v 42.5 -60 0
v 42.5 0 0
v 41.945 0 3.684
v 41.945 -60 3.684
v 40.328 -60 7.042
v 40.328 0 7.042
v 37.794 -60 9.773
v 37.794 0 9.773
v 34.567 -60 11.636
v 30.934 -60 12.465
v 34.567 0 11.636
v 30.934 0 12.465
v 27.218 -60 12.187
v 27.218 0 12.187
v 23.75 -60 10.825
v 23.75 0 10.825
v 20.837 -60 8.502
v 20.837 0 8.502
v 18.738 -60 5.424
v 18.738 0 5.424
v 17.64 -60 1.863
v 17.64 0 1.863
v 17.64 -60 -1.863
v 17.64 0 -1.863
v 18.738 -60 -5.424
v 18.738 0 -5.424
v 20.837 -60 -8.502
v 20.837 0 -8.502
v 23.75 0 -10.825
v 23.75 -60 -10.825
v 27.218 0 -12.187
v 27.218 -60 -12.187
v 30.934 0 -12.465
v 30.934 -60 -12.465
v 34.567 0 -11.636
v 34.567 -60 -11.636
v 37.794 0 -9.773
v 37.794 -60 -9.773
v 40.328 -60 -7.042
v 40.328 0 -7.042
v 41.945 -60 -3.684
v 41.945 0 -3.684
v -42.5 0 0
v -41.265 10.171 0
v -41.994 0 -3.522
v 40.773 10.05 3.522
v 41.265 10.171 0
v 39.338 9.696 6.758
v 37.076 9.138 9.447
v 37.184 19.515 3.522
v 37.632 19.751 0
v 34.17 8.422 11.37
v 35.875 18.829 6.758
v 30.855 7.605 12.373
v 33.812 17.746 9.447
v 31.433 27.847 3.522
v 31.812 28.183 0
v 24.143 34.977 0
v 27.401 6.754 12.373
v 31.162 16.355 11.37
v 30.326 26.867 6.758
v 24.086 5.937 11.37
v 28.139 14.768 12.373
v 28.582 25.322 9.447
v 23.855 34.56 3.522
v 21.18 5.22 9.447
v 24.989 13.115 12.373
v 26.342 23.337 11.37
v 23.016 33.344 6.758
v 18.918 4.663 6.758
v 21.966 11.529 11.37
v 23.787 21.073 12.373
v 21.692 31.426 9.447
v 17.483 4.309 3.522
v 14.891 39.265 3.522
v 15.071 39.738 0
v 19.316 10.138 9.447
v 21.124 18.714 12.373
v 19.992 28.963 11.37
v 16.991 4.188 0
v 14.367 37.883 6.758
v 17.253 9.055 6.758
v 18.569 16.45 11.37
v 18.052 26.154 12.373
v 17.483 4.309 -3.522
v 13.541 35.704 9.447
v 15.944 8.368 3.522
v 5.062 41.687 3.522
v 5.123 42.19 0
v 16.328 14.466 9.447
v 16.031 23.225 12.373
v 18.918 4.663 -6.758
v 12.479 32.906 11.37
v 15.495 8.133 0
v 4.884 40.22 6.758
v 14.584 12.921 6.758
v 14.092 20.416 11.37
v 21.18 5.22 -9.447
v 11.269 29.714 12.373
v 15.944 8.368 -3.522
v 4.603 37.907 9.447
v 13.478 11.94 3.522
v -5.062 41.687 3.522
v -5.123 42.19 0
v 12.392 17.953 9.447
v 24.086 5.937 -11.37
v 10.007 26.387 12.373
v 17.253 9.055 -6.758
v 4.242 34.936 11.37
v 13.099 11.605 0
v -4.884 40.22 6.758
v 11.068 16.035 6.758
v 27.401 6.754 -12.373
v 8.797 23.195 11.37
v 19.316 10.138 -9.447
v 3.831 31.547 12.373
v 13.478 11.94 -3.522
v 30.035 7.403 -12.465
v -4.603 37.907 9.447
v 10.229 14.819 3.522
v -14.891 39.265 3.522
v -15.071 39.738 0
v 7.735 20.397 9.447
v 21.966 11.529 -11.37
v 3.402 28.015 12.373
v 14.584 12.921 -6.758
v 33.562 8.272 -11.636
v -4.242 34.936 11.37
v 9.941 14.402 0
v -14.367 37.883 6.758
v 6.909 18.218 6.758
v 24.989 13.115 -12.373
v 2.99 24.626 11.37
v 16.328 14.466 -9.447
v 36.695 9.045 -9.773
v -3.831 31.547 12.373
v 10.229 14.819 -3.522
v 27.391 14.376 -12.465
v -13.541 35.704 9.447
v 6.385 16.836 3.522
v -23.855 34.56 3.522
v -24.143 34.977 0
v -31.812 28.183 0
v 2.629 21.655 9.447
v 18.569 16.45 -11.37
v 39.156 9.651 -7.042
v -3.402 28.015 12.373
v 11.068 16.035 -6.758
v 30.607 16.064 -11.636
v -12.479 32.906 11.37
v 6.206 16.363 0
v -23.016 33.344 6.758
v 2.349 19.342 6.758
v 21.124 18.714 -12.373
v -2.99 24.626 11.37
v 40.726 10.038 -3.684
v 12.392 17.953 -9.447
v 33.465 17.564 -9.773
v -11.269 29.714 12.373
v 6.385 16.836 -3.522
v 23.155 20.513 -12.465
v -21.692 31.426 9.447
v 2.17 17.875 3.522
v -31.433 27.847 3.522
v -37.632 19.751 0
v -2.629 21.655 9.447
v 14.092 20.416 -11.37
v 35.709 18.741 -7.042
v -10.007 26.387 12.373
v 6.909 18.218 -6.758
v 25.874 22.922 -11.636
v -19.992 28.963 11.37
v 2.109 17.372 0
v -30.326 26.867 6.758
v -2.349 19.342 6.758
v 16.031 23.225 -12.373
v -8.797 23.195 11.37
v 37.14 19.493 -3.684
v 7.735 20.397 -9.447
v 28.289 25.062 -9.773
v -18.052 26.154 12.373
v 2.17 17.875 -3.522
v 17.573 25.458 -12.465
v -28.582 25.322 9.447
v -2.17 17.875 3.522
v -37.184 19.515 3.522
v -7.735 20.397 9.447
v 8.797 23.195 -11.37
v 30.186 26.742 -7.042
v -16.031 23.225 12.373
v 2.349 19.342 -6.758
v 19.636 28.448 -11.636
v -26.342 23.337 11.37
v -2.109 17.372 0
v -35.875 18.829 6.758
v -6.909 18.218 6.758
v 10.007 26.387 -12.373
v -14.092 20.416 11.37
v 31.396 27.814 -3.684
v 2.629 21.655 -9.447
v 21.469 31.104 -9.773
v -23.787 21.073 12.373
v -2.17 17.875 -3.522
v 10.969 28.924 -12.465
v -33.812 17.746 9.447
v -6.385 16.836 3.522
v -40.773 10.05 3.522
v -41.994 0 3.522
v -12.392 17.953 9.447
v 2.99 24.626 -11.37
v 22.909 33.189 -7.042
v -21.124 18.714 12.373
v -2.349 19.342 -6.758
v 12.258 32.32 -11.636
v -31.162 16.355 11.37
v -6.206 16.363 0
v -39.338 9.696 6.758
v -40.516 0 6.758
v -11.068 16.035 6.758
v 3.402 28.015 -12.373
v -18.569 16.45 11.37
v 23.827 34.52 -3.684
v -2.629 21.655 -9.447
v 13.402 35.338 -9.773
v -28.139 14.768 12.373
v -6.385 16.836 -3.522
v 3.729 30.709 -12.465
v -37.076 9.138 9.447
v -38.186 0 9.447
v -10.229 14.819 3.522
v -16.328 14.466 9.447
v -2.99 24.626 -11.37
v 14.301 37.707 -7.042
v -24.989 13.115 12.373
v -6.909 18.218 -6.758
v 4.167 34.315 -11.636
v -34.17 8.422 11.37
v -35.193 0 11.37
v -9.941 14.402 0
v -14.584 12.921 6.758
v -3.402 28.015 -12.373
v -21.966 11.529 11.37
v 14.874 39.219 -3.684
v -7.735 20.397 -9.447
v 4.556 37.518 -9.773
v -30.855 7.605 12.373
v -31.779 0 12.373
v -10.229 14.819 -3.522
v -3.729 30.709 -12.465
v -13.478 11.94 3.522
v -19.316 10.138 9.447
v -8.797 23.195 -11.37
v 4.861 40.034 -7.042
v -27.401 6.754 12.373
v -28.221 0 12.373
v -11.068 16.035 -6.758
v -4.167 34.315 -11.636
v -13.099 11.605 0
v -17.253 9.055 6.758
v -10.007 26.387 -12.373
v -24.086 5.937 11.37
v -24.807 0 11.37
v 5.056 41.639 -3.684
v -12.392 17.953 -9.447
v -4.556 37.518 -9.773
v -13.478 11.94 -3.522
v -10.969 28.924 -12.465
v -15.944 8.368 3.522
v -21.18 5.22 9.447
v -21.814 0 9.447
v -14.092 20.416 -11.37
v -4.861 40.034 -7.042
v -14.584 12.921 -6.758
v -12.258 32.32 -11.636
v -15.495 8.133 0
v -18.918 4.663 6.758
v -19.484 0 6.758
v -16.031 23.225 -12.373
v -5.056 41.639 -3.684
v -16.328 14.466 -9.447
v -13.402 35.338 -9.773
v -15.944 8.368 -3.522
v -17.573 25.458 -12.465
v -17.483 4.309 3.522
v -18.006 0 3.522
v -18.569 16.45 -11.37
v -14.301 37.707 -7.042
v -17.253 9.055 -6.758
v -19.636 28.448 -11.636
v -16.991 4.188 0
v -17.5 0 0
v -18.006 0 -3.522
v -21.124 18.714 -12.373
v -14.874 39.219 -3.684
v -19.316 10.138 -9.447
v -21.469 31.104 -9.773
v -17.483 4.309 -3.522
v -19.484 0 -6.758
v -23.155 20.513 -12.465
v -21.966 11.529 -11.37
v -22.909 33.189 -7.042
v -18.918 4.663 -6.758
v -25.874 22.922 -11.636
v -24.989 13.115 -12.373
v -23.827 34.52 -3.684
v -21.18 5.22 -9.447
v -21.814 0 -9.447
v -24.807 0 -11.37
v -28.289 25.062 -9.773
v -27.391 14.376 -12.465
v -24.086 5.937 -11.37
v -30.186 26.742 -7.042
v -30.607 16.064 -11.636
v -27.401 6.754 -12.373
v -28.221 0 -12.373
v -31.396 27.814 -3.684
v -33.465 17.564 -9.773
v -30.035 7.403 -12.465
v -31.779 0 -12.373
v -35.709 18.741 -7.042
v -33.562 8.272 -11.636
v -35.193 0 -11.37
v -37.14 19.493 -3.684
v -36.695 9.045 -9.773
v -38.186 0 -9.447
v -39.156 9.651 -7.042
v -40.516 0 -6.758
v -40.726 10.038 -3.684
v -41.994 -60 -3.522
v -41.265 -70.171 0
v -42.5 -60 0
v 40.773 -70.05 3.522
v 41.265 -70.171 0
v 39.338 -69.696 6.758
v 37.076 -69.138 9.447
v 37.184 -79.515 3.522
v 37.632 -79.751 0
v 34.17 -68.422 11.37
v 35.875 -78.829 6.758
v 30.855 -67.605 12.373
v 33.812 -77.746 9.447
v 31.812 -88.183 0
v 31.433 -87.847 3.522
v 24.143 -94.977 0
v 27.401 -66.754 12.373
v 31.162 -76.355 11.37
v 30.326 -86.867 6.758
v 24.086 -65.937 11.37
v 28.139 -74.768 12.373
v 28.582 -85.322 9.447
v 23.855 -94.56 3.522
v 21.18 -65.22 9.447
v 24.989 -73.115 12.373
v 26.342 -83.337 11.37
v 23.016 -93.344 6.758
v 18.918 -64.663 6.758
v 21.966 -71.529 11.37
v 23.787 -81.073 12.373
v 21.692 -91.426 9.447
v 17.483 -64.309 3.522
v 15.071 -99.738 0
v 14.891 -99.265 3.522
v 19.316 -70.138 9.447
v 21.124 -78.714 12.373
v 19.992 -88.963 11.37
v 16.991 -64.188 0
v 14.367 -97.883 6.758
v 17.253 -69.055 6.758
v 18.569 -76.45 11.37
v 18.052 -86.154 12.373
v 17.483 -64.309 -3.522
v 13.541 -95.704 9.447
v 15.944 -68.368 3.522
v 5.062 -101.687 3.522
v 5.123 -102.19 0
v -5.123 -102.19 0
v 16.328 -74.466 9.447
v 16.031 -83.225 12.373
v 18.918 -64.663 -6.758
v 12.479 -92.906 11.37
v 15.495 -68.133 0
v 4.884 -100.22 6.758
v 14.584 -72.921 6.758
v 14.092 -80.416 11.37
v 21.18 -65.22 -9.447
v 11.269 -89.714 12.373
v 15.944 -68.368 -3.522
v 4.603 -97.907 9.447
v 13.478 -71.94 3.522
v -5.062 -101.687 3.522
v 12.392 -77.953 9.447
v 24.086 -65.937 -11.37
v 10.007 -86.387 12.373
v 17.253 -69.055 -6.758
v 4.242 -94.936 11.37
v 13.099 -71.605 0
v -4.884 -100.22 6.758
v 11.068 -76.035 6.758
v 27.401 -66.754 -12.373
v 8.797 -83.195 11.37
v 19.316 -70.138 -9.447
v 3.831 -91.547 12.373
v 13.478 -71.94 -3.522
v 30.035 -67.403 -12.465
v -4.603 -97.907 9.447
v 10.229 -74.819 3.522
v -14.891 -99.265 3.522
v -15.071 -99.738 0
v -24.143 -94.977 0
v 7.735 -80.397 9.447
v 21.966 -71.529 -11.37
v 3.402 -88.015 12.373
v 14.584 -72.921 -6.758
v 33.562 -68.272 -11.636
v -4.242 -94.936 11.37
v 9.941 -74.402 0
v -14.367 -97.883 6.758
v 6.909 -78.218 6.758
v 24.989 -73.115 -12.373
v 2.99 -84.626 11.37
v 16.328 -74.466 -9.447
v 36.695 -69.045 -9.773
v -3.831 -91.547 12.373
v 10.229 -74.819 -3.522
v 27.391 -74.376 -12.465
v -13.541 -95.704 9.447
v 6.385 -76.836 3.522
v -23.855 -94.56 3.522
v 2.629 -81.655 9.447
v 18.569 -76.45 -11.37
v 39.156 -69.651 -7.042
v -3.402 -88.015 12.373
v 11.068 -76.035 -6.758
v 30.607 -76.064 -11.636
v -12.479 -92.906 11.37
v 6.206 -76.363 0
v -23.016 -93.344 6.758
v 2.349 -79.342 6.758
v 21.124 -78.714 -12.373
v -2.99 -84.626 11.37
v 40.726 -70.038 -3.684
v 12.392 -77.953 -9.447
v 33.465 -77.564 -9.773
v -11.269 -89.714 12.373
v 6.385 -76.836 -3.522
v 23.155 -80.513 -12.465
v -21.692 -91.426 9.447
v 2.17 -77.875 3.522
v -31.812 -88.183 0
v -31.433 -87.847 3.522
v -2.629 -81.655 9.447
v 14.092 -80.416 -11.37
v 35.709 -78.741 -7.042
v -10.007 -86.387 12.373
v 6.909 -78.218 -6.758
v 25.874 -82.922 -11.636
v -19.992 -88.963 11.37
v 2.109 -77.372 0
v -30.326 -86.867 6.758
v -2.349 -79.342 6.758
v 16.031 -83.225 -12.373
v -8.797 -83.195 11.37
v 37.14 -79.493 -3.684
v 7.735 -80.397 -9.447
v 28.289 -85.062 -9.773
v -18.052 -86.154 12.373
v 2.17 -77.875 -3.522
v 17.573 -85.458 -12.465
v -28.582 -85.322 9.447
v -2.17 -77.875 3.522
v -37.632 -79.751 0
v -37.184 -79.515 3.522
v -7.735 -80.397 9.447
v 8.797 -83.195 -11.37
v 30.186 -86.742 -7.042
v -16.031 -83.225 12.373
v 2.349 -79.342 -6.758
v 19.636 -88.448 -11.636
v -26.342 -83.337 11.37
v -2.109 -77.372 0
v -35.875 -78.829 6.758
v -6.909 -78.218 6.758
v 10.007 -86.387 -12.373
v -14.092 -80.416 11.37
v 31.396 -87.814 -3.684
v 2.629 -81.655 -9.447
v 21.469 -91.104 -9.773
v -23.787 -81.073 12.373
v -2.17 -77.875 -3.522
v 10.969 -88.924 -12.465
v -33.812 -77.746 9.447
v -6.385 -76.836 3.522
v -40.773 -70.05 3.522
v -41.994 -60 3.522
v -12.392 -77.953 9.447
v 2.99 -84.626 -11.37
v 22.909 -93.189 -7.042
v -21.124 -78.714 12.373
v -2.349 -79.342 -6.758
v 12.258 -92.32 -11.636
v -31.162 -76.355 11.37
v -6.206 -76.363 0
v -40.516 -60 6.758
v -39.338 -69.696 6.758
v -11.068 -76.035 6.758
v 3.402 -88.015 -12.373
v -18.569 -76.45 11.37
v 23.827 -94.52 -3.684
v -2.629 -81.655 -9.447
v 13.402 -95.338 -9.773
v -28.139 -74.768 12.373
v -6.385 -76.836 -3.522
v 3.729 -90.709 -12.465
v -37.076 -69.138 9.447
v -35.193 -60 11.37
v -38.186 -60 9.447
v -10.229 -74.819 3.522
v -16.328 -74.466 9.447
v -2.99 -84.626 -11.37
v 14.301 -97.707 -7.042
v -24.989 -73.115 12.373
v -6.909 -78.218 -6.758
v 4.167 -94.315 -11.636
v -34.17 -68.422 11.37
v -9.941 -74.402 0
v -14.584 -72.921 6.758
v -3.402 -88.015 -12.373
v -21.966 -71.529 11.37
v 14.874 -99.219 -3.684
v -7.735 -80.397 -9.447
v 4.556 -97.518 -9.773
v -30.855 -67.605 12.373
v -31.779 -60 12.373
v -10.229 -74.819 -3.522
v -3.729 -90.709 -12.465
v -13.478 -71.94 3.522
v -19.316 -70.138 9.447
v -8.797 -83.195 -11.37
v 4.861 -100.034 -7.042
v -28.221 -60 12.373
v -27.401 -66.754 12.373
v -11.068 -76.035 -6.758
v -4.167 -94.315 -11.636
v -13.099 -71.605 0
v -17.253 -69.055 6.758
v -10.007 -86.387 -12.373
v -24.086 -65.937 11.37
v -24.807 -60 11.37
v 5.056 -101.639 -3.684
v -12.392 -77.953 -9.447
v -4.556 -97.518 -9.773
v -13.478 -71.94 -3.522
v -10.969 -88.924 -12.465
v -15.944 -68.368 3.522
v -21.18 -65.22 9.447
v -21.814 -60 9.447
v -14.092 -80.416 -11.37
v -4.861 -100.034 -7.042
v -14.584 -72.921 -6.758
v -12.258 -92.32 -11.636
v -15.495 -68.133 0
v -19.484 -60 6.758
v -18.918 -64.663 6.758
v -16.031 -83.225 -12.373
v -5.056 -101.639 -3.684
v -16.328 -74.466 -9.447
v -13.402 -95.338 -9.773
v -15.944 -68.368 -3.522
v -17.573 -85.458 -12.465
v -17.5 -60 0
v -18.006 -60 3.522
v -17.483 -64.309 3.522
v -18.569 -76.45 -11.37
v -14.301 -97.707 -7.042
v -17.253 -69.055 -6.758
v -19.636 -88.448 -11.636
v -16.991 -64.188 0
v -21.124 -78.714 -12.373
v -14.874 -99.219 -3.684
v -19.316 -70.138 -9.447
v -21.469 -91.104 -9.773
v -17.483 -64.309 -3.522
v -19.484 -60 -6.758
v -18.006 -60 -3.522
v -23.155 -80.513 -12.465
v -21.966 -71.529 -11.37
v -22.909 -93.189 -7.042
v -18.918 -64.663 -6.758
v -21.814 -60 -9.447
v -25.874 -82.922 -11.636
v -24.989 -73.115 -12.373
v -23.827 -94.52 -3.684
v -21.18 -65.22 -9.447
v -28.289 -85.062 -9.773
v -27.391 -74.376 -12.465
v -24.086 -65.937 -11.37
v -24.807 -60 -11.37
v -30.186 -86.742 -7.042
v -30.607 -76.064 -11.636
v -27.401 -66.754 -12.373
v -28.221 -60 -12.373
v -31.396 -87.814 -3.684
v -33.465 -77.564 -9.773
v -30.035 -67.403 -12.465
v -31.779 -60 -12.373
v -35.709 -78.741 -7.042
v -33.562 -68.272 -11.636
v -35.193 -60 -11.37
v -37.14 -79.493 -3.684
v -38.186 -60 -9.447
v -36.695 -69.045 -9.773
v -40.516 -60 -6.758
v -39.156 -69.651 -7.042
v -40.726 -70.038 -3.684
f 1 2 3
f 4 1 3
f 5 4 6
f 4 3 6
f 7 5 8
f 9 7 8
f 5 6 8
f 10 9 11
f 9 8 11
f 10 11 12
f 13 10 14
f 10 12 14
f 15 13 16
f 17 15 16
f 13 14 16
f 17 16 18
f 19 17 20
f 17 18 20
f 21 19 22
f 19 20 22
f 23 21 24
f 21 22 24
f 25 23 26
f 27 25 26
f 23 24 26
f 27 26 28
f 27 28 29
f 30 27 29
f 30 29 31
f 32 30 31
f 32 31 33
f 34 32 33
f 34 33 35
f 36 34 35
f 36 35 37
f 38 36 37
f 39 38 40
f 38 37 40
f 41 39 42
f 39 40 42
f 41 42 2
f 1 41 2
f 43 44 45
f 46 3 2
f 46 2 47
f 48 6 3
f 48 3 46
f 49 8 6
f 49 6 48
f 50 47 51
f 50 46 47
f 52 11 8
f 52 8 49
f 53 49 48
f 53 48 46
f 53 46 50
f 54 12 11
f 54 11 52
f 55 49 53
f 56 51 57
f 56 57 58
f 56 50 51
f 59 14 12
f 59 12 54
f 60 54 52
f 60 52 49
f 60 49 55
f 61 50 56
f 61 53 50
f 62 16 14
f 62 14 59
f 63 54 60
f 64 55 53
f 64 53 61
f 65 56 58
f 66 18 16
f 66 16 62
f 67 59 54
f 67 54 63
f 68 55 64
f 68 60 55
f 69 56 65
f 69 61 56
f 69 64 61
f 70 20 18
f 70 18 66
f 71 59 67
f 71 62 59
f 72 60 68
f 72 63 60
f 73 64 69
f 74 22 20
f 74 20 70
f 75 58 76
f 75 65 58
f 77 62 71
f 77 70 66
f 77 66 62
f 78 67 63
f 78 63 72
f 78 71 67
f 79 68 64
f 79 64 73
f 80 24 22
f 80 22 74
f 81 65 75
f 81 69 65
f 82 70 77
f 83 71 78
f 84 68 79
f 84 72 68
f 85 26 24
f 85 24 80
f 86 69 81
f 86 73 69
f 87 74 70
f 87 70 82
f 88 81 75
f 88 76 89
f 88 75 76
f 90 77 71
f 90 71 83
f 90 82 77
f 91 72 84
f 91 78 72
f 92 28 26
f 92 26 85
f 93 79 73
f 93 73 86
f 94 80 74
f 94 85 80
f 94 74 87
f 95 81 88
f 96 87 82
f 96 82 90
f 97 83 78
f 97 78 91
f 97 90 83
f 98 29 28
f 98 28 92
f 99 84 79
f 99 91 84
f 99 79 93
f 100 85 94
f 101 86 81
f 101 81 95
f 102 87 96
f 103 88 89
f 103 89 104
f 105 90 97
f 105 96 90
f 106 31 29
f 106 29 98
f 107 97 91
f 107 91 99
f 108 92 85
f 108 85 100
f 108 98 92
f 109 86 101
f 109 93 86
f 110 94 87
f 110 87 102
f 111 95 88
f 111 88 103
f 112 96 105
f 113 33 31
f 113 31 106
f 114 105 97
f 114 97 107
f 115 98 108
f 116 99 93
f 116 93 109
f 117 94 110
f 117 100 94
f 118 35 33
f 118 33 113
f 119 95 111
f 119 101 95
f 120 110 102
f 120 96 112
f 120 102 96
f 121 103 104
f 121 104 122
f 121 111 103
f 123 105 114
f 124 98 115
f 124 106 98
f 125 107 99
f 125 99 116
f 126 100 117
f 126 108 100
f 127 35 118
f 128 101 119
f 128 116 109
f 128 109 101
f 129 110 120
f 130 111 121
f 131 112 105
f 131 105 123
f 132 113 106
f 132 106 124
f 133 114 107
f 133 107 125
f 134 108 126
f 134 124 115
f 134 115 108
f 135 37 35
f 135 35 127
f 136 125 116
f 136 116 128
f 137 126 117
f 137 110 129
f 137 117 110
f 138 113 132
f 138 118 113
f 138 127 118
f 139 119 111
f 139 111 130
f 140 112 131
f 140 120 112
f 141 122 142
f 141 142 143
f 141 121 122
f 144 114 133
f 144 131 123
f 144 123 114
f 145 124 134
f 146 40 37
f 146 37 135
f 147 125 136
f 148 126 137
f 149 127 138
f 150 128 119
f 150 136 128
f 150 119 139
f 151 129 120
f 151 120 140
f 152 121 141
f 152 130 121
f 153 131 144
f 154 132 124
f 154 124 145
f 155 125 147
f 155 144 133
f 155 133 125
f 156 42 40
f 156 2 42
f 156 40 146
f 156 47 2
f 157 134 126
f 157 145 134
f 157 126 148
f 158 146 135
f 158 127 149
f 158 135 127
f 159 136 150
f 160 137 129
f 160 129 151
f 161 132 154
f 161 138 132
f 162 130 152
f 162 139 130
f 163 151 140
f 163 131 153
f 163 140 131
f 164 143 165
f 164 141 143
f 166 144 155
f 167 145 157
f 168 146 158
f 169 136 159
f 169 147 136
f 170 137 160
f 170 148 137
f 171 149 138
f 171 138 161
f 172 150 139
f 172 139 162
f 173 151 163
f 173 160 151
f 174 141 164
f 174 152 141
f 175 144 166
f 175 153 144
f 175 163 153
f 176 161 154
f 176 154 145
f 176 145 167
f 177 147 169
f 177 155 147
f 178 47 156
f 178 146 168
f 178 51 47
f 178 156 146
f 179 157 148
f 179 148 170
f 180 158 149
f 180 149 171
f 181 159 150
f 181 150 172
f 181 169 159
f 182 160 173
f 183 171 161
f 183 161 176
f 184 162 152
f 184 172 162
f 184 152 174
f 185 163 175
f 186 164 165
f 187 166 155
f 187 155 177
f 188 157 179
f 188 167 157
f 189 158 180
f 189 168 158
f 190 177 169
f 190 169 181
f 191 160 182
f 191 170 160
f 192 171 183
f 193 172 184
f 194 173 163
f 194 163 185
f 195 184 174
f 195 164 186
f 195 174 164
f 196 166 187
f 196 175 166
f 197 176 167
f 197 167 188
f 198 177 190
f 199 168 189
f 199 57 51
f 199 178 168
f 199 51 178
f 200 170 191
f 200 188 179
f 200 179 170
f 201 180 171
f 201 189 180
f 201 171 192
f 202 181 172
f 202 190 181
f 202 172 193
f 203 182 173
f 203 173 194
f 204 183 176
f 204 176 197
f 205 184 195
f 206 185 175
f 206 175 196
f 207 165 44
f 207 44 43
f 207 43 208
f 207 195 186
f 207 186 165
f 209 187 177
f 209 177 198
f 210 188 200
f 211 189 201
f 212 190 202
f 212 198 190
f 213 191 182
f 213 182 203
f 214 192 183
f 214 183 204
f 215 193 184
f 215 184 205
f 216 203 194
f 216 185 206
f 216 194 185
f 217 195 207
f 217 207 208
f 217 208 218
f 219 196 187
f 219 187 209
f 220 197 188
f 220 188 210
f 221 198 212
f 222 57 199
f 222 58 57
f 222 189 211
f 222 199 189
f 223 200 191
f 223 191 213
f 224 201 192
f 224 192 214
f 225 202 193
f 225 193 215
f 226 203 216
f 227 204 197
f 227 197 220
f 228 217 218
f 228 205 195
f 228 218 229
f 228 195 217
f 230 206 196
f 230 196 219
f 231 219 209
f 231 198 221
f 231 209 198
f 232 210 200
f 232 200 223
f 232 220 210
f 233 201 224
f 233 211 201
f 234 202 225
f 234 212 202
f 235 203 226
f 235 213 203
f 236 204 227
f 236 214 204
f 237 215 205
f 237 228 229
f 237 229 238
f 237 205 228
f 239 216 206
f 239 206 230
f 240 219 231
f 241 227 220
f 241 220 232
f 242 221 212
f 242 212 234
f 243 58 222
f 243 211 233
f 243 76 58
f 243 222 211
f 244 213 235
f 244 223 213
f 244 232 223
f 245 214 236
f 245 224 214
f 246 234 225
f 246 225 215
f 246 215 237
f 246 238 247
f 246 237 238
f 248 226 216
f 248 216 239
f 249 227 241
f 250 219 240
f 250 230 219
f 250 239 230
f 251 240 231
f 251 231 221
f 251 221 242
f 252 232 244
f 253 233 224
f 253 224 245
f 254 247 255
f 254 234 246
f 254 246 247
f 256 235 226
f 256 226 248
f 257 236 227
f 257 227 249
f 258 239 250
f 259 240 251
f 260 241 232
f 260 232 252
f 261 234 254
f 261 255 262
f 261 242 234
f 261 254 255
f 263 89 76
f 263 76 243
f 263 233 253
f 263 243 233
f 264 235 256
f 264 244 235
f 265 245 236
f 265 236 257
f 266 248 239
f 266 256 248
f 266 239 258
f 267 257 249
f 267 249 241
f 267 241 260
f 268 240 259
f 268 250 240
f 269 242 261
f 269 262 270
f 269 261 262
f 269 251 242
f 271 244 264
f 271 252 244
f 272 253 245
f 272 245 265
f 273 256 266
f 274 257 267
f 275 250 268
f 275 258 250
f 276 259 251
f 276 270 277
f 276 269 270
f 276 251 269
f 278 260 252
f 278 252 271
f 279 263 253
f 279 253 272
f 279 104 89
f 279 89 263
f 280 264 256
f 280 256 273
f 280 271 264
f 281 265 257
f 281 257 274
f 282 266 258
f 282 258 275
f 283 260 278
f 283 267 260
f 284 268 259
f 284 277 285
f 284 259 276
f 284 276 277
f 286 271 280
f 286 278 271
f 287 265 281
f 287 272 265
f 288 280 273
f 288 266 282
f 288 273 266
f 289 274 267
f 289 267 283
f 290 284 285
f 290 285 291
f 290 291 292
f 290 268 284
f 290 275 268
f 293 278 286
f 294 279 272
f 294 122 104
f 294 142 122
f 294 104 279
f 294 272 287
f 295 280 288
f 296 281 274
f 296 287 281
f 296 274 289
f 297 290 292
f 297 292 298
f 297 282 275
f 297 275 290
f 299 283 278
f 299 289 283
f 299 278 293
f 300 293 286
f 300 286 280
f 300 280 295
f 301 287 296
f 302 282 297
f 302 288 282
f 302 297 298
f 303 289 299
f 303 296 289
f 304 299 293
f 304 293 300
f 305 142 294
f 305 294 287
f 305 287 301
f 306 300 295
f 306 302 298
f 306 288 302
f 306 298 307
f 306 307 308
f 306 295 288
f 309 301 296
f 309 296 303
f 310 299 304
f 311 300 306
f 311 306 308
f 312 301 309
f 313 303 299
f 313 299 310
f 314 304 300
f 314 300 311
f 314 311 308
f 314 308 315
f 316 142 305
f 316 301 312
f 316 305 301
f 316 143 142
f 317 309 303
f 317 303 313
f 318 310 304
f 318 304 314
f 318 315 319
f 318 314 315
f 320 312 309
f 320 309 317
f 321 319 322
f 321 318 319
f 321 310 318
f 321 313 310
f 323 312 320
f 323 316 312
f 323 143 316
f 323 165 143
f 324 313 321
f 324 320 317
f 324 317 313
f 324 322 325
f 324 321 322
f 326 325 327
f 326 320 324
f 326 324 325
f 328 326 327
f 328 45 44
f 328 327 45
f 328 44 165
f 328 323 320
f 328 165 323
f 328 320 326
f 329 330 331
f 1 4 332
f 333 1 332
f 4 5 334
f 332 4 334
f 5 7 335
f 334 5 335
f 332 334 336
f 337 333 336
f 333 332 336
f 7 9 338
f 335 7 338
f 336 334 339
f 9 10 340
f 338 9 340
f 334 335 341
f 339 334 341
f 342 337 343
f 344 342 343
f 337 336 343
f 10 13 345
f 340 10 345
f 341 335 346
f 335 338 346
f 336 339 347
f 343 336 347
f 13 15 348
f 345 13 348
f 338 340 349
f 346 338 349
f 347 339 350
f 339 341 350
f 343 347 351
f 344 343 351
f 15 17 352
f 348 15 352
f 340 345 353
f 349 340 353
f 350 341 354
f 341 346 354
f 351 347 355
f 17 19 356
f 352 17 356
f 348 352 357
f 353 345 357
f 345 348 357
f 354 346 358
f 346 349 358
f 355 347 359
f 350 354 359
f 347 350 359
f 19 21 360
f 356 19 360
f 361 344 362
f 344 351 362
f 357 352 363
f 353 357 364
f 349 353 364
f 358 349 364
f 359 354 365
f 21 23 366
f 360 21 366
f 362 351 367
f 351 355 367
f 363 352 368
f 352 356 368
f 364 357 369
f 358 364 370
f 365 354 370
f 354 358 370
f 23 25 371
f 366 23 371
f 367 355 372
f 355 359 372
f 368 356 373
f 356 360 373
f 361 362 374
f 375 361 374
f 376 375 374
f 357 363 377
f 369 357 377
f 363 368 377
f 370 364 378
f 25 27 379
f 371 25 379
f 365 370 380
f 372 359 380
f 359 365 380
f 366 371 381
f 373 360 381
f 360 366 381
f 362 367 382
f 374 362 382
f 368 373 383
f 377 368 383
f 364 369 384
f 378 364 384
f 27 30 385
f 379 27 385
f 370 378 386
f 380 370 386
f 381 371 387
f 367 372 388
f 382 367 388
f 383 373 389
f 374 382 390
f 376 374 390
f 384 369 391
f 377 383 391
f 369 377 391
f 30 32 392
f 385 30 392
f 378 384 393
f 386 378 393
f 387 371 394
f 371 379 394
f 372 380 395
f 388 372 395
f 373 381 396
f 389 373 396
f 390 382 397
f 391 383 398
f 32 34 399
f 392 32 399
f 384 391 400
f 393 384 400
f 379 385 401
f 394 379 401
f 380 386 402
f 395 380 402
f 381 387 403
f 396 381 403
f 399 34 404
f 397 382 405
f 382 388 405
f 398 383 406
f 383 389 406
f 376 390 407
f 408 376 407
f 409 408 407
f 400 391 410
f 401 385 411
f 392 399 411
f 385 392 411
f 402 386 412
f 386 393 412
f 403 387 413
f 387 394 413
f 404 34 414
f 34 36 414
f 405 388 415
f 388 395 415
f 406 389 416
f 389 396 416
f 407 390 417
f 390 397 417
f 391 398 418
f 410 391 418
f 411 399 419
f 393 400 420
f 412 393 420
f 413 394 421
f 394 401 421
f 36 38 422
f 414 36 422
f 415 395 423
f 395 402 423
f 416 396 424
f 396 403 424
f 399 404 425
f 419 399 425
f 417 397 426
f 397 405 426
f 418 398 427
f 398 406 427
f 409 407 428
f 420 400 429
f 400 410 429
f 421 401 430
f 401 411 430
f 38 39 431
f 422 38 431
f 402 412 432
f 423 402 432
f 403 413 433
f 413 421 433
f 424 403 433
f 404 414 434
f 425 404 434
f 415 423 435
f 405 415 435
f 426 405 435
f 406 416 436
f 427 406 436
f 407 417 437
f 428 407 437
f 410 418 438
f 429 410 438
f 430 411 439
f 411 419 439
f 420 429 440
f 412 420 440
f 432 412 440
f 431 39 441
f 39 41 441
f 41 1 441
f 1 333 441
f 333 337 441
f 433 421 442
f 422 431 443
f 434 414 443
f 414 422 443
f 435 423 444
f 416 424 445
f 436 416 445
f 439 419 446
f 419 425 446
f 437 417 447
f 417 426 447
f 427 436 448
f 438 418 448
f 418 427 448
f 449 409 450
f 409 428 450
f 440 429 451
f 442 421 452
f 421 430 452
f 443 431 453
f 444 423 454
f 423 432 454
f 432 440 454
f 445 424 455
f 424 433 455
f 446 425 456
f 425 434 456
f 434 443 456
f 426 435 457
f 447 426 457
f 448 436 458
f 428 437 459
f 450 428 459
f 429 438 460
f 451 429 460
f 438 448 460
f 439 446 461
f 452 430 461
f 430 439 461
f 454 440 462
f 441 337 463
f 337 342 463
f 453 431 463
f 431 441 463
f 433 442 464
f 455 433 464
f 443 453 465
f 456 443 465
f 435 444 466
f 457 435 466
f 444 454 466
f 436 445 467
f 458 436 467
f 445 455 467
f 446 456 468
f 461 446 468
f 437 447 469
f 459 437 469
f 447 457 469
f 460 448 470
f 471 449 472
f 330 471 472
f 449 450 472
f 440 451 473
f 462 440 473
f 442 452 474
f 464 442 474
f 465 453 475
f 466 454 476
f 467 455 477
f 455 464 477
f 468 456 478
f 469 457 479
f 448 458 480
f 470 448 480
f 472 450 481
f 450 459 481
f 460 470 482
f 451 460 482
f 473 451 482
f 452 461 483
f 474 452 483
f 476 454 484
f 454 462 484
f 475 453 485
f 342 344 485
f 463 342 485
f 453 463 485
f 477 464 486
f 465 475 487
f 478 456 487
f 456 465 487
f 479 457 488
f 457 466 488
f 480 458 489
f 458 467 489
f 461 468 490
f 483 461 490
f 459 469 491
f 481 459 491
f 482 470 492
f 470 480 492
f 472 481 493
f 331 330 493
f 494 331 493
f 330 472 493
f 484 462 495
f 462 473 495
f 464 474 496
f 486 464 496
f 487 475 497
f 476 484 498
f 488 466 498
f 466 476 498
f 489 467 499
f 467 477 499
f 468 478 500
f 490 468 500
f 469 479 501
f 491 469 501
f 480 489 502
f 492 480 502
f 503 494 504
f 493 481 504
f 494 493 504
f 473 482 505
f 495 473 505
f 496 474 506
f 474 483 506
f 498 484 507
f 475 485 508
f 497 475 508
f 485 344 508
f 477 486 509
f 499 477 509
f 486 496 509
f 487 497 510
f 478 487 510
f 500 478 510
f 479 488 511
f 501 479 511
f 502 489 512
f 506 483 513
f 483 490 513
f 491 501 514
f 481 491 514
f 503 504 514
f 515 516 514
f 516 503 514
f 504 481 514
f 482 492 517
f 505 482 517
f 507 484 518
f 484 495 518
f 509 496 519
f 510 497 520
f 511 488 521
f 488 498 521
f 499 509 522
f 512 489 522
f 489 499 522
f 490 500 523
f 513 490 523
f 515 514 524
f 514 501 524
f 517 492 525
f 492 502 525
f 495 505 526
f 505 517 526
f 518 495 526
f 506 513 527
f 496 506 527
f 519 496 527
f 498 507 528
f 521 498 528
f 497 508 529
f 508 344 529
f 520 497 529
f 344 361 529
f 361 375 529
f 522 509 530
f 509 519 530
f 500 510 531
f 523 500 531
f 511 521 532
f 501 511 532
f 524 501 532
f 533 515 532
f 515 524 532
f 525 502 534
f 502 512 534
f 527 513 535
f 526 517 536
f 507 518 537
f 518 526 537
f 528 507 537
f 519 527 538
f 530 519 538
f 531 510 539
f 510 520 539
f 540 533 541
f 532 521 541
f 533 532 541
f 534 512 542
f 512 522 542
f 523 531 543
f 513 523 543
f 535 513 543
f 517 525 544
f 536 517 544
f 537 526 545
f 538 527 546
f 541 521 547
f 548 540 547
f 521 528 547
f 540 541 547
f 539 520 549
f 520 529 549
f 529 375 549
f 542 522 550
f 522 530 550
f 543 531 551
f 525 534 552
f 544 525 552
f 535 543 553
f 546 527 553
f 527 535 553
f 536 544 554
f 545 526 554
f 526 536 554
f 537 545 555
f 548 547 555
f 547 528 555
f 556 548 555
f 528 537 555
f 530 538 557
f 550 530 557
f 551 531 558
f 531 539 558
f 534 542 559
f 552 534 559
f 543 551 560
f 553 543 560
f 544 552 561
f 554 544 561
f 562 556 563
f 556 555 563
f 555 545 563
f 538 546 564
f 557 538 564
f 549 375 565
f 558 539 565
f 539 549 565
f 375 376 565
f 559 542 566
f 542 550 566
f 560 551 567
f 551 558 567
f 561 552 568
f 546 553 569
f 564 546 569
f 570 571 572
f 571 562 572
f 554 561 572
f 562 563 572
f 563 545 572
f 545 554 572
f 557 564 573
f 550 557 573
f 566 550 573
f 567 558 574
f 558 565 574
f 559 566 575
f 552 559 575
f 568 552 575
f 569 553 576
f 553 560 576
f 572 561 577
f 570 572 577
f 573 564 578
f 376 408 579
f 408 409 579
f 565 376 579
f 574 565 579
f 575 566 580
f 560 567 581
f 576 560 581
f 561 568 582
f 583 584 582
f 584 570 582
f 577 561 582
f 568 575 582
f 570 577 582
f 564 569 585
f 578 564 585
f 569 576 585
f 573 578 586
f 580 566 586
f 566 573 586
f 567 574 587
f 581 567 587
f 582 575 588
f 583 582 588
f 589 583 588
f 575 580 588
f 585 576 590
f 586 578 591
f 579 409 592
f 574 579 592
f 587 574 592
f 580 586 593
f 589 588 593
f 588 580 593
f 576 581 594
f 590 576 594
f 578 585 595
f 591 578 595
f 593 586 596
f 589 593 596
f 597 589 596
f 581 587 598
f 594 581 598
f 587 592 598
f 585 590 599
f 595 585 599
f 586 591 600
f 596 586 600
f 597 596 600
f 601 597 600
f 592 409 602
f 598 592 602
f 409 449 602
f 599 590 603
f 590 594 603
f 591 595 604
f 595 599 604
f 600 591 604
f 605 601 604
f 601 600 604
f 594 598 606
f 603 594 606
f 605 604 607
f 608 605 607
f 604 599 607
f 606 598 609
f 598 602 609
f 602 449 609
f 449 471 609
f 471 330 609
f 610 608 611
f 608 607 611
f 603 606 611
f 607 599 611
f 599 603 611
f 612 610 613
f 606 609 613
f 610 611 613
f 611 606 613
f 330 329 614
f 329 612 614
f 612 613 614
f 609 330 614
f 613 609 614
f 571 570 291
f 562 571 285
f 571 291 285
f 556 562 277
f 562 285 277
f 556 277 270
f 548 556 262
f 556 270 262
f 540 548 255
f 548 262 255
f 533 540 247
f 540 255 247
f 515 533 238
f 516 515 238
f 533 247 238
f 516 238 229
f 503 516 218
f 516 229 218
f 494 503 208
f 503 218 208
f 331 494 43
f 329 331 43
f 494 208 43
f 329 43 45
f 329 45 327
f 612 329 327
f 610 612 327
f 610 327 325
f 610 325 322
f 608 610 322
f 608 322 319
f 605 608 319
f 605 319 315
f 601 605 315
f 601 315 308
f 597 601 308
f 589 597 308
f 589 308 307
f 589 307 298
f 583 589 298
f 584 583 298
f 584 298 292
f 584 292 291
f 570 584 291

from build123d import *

# Parameters (mm, degrees)
F0_R      = 12.5
F1_ANGLE  = -180
F1_FACE_R = 12.5
F2_DEPTH  = 60
F3_R      = 12.5
F4_ANGLE  = 180


with BuildPart() as f1:
    # F0 (on Front) → F1 (revolve)
    with BuildSketch(Plane.XZ):
        with Locations((30, 0)):
            Circle(F0_R)
    revolve(axis=Axis((0, 0, -0.948295), (0, 0, -1)), revolution_arc=F1_ANGLE)

    # F1_face (on face) → F2 (join)
    with BuildSketch(Plane(origin=(30, 0, 0), x_dir=(1, 0, 0), z_dir=(0, -1, 0))):
        Circle(F1_FACE_R)
        with Locations((-60, 0)):
            Circle(F1_FACE_R)
    extrude(amount=F2_DEPTH)

    # F3 (on face) → F4 (revolve)
    with BuildSketch(Plane.XZ.offset(60)):
        with Locations((30, 0)):
            Circle(F3_R)
    revolve(axis=Axis((0, -60, -8.781475), (0, 0, -1)), revolution_arc=F4_ANGLE)


solid = f1.part
